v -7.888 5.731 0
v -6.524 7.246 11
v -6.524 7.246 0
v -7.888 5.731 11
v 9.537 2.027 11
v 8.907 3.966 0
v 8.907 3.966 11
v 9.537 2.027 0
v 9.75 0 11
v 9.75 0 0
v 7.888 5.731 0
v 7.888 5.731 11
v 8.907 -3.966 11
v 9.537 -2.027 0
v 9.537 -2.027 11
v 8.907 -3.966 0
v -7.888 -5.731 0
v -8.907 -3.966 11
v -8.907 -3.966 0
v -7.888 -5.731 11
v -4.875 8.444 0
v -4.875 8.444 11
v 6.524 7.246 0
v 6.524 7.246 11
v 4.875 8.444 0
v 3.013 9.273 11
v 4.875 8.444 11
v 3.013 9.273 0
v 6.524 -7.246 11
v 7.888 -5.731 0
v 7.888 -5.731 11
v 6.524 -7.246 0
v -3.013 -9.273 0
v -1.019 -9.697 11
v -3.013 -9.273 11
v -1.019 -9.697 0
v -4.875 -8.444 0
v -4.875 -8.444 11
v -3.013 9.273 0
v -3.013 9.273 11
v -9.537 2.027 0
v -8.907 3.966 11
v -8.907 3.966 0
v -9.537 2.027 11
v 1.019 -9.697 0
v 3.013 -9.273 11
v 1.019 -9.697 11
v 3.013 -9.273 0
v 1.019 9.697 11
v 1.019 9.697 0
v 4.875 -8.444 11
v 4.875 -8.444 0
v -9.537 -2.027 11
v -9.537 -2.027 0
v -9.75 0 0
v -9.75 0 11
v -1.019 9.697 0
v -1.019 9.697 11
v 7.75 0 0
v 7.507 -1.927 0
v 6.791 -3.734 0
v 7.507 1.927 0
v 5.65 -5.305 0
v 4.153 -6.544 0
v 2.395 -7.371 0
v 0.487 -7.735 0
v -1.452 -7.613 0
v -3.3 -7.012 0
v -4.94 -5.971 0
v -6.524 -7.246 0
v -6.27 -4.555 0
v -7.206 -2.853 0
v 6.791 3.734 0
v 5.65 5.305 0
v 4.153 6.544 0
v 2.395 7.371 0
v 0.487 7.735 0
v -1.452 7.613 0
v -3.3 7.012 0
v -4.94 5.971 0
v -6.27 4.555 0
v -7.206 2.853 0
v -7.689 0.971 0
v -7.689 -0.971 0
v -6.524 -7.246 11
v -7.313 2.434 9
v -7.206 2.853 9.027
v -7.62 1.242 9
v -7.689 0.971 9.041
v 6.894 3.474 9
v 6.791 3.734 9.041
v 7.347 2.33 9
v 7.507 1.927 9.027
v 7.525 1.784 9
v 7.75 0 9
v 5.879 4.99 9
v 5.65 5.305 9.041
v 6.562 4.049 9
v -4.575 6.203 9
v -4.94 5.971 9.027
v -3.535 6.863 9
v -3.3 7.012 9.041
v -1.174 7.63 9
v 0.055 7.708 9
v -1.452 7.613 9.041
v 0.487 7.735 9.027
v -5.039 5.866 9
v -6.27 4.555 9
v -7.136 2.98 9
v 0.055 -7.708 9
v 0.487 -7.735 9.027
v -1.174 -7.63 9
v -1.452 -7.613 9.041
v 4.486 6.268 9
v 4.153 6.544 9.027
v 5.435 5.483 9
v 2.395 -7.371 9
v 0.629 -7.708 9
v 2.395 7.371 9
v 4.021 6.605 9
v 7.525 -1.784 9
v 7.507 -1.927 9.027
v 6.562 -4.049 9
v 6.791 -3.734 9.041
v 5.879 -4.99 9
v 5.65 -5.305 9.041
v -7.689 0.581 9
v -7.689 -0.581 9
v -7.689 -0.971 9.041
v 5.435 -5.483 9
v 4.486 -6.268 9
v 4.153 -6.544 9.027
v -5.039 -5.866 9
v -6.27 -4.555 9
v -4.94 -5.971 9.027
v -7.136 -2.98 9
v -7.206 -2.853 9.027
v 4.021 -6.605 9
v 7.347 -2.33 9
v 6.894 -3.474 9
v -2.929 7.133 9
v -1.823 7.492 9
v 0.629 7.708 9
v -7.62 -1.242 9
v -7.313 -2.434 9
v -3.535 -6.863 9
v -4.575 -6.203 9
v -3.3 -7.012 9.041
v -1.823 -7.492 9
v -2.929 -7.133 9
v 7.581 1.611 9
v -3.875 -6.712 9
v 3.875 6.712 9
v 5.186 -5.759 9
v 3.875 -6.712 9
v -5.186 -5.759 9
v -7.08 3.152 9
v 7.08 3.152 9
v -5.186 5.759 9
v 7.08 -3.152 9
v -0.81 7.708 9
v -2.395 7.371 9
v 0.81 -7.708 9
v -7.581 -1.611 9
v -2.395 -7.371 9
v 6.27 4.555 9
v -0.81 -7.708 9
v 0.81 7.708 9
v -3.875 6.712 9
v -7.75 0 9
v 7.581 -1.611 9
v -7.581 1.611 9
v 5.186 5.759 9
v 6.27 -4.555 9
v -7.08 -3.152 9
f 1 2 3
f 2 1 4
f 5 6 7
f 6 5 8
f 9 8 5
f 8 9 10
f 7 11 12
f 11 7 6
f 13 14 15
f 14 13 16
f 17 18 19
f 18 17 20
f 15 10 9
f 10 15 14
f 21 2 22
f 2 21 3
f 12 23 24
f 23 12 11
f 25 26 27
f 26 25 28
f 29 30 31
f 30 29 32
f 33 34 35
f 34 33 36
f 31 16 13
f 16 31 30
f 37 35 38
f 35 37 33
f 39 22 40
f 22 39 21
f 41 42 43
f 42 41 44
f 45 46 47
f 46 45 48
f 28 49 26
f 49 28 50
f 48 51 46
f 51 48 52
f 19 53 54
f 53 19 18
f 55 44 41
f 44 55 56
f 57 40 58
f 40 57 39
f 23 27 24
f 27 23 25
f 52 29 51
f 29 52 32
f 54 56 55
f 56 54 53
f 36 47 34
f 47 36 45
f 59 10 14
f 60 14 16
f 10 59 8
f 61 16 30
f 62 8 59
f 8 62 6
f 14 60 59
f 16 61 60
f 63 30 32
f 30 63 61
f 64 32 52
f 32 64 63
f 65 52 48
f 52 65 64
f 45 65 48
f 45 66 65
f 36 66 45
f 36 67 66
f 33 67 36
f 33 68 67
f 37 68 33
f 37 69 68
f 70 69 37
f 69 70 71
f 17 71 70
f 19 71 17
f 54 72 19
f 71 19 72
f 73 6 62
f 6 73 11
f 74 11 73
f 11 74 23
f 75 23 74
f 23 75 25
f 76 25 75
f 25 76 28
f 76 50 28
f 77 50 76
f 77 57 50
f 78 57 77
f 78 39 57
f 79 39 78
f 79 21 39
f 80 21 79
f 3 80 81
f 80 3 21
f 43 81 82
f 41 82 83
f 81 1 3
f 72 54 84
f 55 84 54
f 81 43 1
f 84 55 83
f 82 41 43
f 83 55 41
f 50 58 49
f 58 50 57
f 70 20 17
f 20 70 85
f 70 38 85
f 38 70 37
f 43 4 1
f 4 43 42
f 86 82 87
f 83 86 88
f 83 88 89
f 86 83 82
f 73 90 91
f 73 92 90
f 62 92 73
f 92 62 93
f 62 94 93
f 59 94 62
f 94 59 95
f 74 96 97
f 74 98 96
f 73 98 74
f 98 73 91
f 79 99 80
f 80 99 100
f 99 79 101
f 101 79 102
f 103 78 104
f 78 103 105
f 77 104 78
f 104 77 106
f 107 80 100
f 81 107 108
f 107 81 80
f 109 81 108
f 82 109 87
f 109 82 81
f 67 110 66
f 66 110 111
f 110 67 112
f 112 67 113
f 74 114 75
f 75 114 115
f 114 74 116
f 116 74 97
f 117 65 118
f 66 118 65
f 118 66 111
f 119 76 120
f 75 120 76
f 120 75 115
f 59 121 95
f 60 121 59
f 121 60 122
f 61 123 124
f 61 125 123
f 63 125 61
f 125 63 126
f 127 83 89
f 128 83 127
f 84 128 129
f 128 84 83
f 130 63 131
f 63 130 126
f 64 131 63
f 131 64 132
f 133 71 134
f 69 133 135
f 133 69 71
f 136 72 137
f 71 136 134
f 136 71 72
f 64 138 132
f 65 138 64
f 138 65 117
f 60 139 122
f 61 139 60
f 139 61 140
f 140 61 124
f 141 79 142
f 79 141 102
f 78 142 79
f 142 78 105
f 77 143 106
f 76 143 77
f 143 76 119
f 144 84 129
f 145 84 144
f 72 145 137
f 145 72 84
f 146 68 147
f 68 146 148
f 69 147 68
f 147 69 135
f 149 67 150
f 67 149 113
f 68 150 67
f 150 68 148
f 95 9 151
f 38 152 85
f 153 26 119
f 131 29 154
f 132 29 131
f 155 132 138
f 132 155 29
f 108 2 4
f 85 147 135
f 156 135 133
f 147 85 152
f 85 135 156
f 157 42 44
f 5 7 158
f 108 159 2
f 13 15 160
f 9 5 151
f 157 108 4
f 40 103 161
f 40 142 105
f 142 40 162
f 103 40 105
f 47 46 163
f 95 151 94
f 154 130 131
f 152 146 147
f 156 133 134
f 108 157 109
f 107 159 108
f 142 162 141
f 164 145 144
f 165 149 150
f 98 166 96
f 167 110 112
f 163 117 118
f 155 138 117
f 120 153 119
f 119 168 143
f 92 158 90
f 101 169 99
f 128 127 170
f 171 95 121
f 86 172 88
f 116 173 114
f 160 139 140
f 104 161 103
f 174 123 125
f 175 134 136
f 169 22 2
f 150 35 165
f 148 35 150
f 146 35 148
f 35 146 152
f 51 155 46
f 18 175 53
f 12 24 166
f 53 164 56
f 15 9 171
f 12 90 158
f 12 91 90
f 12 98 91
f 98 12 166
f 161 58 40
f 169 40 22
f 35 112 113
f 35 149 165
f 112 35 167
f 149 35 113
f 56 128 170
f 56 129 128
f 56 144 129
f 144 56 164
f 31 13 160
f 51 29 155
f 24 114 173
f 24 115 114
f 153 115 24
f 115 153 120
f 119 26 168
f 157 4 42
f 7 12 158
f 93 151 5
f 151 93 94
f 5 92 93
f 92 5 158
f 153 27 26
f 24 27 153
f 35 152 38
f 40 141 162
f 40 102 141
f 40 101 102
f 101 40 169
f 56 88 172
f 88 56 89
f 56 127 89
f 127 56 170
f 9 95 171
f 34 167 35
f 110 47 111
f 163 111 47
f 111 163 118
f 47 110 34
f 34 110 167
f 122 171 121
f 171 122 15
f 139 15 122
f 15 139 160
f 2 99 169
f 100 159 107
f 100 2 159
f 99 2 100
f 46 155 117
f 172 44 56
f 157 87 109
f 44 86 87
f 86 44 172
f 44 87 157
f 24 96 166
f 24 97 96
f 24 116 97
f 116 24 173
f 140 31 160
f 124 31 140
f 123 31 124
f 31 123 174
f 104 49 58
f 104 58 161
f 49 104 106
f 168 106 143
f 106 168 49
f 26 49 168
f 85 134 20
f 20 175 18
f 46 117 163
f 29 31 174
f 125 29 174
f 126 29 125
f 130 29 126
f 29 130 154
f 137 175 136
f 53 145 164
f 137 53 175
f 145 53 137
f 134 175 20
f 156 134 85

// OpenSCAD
//I purchased a few loose triplet lenses from surplusshed.com
//This is a holder for one of them, designed to fit into the camera mount specified in another file
//Printed in black ABS so as to absorb light and be slightly softer,
// since it has to fit into the camera mount. 
lens_diameter= 15;
lens_cushion=  .5;
lens_radius = (lens_diameter+lens_cushion)/2;
lens_height = 11;
mount_diameter = 20;
mount_cushion = .5;
mount_radius = (mount_diameter-mount_cushion)/2;

difference() {
cylinder (h=lens_height, r=mount_radius);
cylinder (h=lens_height, r=lens_radius);
translate([0,0,9]) {cylinder(h=2, r1=lens_radius, r2=mount_radius);}
}
